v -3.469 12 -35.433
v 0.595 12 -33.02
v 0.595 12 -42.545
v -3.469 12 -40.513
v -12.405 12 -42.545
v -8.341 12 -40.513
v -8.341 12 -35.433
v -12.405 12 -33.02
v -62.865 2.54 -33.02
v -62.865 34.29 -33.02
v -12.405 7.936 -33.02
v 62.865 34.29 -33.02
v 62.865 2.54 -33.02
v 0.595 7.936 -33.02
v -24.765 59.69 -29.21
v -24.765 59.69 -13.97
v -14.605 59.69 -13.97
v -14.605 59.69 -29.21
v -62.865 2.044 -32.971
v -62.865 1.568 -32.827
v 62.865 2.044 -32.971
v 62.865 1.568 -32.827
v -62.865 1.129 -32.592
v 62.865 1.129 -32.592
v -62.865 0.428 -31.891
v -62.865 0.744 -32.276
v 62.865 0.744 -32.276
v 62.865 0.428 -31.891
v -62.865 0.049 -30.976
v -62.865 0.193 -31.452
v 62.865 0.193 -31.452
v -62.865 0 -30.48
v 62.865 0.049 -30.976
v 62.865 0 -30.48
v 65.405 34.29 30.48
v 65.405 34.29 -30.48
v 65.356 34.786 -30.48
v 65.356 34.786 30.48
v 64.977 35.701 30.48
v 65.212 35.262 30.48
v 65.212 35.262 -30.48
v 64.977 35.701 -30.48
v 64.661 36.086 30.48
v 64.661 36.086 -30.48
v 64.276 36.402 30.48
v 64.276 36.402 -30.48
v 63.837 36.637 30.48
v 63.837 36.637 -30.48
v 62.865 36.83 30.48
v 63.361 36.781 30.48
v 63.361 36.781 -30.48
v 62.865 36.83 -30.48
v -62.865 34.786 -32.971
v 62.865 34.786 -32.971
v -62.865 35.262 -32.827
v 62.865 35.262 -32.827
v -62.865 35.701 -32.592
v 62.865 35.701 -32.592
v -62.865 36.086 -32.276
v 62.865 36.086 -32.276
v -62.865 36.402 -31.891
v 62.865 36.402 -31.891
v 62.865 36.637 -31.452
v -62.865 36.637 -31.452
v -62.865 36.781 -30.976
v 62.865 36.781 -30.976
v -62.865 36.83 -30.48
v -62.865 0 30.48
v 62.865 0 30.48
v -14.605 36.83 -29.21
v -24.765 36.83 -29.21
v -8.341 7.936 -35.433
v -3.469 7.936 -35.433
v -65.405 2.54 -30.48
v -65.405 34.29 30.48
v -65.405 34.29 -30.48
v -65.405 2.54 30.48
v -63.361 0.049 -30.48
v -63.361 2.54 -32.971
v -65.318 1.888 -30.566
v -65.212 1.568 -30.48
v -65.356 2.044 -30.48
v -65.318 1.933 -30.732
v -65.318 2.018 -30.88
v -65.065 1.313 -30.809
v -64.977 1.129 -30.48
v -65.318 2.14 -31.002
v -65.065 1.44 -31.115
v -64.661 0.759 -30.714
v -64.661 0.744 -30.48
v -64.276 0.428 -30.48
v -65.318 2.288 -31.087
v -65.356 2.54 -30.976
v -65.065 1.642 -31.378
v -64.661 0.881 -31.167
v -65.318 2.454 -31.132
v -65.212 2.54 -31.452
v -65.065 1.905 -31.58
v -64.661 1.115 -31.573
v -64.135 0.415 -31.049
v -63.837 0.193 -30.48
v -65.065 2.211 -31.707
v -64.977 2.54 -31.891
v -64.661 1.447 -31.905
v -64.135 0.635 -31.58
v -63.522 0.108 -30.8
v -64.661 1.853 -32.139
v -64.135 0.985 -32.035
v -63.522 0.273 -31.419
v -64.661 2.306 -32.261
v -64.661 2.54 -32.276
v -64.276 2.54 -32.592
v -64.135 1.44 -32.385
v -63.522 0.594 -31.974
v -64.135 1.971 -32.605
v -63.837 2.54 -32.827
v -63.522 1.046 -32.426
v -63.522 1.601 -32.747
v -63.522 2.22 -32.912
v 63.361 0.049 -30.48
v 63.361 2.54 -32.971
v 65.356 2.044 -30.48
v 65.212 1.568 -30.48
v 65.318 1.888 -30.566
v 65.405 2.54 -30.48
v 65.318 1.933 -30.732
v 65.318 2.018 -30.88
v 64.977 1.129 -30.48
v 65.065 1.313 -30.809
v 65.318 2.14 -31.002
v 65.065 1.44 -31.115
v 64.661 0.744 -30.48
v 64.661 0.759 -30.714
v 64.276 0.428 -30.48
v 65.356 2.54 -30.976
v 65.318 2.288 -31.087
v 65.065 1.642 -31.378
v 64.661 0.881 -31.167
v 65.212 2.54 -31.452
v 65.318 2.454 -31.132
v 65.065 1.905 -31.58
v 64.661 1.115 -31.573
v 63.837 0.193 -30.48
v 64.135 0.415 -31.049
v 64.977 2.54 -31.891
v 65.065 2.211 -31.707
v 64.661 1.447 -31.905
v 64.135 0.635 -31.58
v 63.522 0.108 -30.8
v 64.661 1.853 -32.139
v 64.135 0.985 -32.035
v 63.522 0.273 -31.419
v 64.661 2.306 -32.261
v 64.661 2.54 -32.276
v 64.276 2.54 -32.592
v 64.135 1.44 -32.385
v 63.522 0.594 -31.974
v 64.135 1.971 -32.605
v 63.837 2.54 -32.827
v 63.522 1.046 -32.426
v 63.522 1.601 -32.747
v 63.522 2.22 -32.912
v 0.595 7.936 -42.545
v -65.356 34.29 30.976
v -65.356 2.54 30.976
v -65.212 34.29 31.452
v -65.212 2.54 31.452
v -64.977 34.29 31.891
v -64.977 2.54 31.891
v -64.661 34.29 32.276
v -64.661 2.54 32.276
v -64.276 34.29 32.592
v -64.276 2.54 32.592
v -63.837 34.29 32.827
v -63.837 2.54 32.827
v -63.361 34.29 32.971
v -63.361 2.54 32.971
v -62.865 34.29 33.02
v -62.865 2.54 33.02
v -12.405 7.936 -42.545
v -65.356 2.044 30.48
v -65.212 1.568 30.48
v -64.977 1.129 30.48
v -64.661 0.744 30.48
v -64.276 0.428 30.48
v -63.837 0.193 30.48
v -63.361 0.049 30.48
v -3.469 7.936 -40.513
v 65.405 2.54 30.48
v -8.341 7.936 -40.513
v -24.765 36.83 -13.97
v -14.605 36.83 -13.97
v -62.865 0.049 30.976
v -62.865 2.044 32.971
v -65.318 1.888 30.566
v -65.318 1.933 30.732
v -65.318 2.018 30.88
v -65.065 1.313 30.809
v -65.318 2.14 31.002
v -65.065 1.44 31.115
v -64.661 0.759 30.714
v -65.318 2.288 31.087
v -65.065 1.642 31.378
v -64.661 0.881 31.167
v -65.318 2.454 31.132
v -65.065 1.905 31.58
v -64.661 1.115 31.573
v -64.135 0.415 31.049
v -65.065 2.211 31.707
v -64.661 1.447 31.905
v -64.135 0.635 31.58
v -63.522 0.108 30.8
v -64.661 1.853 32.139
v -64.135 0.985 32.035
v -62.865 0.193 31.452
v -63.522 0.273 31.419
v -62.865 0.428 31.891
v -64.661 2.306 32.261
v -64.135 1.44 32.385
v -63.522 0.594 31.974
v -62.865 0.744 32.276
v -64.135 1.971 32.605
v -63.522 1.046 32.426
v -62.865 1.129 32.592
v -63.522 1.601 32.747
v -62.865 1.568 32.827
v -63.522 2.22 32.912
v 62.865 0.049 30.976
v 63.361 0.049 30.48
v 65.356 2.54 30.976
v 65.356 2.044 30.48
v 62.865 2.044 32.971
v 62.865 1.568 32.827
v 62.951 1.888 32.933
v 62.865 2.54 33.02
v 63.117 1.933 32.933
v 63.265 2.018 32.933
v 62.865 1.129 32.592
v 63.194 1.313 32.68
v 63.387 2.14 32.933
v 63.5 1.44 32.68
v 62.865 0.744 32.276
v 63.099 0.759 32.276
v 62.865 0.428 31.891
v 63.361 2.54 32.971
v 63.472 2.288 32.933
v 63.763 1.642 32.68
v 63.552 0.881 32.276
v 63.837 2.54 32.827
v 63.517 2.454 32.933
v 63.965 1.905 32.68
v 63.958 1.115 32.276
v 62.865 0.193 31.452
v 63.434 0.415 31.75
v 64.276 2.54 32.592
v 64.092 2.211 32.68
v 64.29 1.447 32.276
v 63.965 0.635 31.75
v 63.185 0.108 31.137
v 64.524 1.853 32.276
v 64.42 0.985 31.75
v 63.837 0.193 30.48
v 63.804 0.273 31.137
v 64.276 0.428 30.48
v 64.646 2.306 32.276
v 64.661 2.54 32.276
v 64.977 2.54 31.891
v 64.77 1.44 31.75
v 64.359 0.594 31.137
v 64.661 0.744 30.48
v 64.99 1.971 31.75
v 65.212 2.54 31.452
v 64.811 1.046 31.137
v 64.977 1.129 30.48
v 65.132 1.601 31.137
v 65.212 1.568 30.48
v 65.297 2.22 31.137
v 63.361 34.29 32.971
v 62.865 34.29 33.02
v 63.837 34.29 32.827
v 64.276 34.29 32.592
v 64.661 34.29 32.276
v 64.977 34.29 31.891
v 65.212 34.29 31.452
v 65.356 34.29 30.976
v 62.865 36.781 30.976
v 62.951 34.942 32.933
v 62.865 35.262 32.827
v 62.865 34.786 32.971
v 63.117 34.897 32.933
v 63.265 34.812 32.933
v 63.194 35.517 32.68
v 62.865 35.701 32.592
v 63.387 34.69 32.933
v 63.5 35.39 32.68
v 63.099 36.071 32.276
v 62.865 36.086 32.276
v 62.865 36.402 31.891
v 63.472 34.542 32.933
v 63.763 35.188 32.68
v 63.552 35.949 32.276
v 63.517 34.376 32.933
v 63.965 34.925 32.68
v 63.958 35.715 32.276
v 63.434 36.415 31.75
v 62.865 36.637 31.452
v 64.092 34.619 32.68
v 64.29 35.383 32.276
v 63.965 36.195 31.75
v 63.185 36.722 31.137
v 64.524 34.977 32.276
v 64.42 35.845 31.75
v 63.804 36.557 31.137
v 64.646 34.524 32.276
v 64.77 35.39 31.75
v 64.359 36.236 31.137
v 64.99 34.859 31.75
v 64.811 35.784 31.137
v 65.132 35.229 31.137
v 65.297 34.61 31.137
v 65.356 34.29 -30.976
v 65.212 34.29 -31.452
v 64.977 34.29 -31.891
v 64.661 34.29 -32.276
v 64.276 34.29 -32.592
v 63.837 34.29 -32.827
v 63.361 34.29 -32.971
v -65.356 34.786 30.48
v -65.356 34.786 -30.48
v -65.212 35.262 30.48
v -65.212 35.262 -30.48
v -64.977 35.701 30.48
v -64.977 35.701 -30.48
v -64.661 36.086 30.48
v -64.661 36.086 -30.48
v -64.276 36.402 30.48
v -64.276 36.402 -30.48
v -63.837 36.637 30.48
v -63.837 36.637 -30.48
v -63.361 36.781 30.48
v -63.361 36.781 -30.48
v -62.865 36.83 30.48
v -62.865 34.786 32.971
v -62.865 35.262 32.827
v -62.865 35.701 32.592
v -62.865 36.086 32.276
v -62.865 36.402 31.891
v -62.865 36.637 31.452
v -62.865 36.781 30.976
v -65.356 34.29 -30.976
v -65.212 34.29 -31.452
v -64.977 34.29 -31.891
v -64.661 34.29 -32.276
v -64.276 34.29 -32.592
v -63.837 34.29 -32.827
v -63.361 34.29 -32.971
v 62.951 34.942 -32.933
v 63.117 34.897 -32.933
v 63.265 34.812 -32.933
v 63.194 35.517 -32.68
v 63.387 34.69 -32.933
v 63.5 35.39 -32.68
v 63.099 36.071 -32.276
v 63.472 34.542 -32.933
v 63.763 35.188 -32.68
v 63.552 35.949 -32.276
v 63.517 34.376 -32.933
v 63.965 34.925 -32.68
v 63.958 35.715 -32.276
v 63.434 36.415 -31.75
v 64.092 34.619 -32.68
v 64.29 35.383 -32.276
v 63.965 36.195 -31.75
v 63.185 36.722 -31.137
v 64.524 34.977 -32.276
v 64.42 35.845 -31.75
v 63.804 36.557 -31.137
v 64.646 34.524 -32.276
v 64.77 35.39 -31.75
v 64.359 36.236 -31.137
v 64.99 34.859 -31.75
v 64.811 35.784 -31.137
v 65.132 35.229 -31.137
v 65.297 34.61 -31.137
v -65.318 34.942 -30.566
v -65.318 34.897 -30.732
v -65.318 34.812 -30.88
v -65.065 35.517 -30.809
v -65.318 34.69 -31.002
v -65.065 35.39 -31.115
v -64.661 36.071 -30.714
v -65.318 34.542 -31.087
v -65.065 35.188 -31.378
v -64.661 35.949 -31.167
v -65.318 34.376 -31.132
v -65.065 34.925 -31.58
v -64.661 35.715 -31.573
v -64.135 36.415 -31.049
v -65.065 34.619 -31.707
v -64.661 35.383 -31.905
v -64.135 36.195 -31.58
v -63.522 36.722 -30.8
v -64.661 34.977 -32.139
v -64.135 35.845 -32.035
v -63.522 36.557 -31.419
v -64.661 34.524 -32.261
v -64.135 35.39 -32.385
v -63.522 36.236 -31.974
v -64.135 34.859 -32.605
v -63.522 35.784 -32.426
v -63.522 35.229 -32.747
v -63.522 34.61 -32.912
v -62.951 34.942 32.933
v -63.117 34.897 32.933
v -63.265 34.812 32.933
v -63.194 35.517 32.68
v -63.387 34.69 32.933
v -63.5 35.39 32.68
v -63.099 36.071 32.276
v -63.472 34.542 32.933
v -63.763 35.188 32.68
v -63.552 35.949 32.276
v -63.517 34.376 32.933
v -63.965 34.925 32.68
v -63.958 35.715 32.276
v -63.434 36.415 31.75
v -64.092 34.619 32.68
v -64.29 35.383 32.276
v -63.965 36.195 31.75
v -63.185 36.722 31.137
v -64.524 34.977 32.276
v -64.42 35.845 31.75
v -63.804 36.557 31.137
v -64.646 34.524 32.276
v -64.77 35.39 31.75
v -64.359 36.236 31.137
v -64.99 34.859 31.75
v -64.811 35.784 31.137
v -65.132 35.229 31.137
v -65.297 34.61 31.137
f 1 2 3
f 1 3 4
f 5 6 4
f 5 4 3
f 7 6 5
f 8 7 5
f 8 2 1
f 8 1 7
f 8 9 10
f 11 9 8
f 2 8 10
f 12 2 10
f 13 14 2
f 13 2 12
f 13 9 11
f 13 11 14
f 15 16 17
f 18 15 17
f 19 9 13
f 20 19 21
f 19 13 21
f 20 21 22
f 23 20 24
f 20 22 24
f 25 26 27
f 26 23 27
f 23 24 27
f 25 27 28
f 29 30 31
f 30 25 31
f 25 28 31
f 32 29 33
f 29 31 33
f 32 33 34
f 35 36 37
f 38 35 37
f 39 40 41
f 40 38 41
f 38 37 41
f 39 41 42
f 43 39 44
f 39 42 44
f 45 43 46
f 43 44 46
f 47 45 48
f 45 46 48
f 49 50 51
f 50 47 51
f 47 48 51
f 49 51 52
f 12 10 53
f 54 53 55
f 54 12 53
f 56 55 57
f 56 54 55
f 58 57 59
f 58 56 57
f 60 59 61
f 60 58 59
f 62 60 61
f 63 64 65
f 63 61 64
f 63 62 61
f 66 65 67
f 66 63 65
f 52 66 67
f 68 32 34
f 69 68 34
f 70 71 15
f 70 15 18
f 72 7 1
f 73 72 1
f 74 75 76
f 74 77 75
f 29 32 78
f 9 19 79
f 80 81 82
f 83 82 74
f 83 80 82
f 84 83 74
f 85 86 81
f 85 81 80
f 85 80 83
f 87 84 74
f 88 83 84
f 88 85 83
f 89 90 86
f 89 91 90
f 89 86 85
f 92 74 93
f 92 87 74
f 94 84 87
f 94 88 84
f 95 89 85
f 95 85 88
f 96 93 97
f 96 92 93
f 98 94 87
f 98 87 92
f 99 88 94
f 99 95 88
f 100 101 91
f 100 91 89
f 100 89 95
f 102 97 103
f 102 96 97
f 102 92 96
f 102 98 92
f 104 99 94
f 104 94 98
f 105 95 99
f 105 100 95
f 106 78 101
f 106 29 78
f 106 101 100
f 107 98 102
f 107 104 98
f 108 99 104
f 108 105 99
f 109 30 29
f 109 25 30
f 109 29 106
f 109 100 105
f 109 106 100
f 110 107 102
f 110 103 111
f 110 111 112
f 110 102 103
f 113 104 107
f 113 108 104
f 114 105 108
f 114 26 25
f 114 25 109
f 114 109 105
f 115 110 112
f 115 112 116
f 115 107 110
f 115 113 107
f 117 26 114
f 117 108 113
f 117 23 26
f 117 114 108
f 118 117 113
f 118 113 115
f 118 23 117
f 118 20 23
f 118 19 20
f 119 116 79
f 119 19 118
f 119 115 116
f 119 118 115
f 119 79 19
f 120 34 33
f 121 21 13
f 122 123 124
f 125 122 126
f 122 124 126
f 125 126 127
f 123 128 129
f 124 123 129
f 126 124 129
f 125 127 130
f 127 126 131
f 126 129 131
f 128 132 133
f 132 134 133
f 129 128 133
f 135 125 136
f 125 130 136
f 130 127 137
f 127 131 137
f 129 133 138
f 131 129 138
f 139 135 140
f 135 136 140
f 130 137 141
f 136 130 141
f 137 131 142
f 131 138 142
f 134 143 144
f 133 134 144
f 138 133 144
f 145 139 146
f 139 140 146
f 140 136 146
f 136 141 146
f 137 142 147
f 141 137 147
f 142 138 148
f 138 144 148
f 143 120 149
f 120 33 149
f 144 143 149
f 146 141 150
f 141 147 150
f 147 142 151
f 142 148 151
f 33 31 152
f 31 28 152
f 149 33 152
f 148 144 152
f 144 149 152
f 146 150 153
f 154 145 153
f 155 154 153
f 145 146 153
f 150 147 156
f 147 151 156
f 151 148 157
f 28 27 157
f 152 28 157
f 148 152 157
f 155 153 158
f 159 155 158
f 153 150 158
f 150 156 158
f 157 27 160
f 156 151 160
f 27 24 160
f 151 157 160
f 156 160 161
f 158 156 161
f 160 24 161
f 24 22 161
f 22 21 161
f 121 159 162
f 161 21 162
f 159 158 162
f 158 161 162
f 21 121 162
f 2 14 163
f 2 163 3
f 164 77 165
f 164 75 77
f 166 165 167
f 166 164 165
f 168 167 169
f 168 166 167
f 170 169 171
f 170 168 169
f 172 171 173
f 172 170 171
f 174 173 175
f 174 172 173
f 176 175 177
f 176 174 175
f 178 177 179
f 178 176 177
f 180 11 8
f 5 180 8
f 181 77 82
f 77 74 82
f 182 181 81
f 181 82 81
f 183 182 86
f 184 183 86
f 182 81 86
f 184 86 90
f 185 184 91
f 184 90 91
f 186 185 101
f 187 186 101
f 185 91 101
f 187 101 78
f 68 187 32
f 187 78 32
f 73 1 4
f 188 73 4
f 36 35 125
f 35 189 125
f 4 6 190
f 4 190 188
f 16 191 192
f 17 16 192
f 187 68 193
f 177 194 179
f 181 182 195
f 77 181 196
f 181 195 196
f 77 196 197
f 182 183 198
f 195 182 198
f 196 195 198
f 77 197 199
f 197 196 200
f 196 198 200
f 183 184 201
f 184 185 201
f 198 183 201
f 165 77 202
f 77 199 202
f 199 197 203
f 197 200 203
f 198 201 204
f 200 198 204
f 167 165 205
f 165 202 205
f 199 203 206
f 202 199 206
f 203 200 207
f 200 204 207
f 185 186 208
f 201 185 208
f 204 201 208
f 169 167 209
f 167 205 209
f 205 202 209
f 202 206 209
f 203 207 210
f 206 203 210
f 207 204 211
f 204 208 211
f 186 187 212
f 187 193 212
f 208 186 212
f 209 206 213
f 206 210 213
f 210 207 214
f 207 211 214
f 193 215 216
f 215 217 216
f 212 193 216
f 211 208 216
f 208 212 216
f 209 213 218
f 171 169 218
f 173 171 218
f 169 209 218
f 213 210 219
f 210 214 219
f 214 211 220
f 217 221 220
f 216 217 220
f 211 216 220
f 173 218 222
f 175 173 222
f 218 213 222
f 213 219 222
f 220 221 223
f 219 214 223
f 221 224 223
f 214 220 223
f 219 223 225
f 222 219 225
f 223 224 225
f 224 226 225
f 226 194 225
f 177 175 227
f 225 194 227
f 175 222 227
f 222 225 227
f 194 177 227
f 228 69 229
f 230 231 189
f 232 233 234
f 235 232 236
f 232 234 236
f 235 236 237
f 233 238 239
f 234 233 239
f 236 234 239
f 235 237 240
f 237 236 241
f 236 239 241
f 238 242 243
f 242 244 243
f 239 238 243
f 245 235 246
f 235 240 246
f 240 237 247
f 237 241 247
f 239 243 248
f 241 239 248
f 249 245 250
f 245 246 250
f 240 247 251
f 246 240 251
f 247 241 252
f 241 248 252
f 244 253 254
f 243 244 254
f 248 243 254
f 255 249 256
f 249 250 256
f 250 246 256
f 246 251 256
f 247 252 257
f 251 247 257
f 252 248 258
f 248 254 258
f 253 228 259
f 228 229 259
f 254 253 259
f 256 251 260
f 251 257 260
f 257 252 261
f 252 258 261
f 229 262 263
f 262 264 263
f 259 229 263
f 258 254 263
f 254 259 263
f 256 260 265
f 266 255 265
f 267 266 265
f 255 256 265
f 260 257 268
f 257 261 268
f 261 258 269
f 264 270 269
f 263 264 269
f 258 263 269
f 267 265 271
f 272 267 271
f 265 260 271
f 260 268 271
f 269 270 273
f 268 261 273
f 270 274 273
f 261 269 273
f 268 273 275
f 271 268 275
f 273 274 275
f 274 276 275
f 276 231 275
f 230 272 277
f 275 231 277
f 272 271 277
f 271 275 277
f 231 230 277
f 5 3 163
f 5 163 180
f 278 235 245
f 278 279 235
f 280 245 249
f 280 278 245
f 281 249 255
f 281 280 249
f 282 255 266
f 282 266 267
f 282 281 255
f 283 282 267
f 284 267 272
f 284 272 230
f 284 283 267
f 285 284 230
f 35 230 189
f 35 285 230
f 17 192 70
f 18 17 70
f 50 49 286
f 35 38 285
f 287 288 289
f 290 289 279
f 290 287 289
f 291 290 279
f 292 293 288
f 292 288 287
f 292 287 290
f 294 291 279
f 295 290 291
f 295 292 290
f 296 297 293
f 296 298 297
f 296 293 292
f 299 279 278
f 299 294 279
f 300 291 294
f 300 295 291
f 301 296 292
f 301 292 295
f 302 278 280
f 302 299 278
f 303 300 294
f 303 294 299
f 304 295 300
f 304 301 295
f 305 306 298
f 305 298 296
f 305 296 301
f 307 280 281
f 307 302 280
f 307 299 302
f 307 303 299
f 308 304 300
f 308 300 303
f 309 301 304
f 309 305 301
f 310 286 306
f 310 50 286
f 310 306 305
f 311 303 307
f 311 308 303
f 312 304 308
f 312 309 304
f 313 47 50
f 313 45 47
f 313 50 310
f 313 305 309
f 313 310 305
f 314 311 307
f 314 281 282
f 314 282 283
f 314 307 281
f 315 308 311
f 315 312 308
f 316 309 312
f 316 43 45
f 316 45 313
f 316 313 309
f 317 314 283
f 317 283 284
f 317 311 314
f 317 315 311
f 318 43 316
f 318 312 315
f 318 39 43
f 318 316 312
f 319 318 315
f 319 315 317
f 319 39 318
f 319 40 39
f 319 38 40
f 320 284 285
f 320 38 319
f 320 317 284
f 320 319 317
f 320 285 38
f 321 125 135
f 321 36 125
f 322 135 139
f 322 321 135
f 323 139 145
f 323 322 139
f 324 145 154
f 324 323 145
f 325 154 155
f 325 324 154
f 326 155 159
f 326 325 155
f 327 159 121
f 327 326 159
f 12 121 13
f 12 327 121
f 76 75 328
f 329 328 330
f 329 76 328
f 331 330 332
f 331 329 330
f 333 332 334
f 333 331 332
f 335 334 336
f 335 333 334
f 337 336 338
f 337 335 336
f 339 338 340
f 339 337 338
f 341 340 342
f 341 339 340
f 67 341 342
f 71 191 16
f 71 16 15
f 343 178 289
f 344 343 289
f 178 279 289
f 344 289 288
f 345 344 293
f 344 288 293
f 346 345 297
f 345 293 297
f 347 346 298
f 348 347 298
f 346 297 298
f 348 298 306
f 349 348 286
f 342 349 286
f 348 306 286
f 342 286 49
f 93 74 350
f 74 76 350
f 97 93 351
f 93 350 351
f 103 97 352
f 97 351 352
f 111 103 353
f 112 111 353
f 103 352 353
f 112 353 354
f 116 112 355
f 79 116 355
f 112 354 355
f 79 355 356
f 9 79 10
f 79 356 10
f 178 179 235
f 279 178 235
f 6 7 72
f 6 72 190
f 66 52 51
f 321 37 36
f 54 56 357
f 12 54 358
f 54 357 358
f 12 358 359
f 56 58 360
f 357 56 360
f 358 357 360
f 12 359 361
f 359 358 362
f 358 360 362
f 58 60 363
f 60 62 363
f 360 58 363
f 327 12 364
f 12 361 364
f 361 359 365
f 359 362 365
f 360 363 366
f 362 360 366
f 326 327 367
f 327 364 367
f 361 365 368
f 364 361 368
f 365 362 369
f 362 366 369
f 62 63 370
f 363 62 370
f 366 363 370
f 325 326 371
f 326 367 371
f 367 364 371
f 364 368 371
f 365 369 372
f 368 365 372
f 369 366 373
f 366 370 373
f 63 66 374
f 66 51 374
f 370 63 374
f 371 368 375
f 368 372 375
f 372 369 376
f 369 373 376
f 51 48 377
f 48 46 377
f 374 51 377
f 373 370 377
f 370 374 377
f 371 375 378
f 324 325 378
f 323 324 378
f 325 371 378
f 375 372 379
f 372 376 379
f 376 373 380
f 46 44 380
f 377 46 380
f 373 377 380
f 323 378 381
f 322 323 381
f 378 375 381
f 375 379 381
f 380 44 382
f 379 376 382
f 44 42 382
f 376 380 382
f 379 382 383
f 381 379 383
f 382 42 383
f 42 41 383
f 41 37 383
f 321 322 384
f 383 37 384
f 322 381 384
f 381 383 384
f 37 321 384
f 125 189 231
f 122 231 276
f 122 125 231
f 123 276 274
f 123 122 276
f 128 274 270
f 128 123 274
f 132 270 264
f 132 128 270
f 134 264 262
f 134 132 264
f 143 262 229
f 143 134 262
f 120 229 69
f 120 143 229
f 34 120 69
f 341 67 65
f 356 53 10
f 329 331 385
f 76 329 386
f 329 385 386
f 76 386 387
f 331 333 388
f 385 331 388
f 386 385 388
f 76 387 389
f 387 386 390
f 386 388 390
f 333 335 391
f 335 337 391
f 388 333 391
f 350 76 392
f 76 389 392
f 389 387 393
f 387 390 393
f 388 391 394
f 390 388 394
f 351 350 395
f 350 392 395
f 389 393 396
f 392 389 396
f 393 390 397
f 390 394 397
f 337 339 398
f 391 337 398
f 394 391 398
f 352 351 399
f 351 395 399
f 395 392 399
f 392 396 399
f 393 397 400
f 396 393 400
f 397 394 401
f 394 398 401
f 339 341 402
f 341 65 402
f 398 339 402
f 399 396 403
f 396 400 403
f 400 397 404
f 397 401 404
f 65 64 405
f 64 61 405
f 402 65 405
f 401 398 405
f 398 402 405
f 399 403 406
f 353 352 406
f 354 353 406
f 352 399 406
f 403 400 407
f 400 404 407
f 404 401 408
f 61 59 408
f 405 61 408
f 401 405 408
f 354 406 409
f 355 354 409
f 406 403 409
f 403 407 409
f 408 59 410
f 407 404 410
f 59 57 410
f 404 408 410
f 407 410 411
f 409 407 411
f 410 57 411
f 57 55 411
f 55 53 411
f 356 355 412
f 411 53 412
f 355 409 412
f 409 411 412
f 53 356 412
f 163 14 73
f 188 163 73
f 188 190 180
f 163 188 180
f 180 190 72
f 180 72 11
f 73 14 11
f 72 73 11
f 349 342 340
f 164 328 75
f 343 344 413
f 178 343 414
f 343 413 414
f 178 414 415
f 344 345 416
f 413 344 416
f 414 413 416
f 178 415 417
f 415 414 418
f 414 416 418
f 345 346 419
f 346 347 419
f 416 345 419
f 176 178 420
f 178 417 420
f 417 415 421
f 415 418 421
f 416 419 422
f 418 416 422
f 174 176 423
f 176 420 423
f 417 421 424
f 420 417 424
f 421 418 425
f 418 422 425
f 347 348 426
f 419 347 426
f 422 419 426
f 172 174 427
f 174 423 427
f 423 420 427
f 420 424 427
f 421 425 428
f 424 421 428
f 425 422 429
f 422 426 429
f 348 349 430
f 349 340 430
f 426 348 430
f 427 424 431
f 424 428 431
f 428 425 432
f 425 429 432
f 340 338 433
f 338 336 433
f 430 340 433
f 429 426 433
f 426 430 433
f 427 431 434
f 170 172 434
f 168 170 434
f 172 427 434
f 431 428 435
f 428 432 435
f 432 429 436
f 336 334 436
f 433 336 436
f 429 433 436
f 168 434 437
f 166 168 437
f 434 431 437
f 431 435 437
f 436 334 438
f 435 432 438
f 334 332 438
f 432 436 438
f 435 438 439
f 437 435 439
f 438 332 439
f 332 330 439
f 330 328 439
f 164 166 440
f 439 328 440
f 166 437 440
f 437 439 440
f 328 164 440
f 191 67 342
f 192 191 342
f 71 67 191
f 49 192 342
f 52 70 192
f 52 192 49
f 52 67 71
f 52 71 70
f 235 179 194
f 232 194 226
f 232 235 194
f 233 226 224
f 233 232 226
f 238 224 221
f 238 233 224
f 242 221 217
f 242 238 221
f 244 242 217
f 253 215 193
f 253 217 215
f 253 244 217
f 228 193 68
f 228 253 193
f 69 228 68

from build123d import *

# Parameters (mm, degrees)
SKETCH1_W           = 130.81
SKETCH1_H           = 66.04
BOSS_EXTRUDE1_DEPTH = 36.83
FILLET1_R           = 2.54
SKETCH2_W           = 10.16
SKETCH2_H           = 15.24
BOSS_EXTRUDE2_DEPTH = 22.86
SKETCH3_W           = 13
SKETCH3_H           = 4.064
BOSS_EXTRUDE3_DEPTH = 9.525
SKETCH4_W           = 4.872
SKETCH4_H           = 5.08
CUT_EXTRUDE1_DEPTH  = 92.445213926


with BuildPart() as part:
    # Sketch1 → Boss-Extrude1 (new body)
    with BuildSketch(Plane(origin=(0, 0, 0), x_dir=(1, 0, 0), z_dir=(0, 1, 0))):
        Rectangle(SKETCH1_W, SKETCH1_H)
    extrude(amount=BOSS_EXTRUDE1_DEPTH)

    # Fillet1
    fillet1_edges = [part.edges().sort_by_distance(p)[0] for p in [
        (65.405, 36.83, 0),
        (0, 36.83, -33.02),
        (-65.405, 36.83, 0),
        (0, 0, -33.02),
        (65.405, 0, 0),
        (0, 0, 33.02),
        (-65.405, 0, 0),
        (0, 36.83, 33.02),
        (-65.405, 18.415, -33.02),
        (65.405, 18.415, -33.02),
        (65.405, 18.415, 33.02),
        (-65.405, 18.415, 33.02),
    ]]
    fillet(fillet1_edges, radius=FILLET1_R)

    # Sketch2 → Boss-Extrude2 (add)
    with BuildSketch(Plane(origin=(0, 36.83, 0), x_dir=(1, 0, 0), z_dir=(0, 1, 0))):
        with Locations((-19.685, 21.59)):
            Rectangle(SKETCH2_W, SKETCH2_H)
    extrude(amount=BOSS_EXTRUDE2_DEPTH)

    # Sketch3 → Boss-Extrude3 (add)
    with BuildSketch(Plane(origin=(0, 0, -33.02), x_dir=(-1, 0, 0), z_dir=(0, 0, -1))):
        with Locations((5.905, 9.968)):
            Rectangle(SKETCH3_W, SKETCH3_H)
    extrude(amount=BOSS_EXTRUDE3_DEPTH)

    # Sketch4 → Cut-Extrude1 (cut, through all)
    with BuildSketch(Plane(origin=(0, 12, 0), x_dir=(1, 0, 0), z_dir=(0, 1, 0))):
        with Locations((-5.905, 37.973)):
            Rectangle(SKETCH4_W, SKETCH4_H)
    extrude(amount=-CUT_EXTRUDE1_DEPTH, mode=Mode.SUBTRACT)


solid = part.part
